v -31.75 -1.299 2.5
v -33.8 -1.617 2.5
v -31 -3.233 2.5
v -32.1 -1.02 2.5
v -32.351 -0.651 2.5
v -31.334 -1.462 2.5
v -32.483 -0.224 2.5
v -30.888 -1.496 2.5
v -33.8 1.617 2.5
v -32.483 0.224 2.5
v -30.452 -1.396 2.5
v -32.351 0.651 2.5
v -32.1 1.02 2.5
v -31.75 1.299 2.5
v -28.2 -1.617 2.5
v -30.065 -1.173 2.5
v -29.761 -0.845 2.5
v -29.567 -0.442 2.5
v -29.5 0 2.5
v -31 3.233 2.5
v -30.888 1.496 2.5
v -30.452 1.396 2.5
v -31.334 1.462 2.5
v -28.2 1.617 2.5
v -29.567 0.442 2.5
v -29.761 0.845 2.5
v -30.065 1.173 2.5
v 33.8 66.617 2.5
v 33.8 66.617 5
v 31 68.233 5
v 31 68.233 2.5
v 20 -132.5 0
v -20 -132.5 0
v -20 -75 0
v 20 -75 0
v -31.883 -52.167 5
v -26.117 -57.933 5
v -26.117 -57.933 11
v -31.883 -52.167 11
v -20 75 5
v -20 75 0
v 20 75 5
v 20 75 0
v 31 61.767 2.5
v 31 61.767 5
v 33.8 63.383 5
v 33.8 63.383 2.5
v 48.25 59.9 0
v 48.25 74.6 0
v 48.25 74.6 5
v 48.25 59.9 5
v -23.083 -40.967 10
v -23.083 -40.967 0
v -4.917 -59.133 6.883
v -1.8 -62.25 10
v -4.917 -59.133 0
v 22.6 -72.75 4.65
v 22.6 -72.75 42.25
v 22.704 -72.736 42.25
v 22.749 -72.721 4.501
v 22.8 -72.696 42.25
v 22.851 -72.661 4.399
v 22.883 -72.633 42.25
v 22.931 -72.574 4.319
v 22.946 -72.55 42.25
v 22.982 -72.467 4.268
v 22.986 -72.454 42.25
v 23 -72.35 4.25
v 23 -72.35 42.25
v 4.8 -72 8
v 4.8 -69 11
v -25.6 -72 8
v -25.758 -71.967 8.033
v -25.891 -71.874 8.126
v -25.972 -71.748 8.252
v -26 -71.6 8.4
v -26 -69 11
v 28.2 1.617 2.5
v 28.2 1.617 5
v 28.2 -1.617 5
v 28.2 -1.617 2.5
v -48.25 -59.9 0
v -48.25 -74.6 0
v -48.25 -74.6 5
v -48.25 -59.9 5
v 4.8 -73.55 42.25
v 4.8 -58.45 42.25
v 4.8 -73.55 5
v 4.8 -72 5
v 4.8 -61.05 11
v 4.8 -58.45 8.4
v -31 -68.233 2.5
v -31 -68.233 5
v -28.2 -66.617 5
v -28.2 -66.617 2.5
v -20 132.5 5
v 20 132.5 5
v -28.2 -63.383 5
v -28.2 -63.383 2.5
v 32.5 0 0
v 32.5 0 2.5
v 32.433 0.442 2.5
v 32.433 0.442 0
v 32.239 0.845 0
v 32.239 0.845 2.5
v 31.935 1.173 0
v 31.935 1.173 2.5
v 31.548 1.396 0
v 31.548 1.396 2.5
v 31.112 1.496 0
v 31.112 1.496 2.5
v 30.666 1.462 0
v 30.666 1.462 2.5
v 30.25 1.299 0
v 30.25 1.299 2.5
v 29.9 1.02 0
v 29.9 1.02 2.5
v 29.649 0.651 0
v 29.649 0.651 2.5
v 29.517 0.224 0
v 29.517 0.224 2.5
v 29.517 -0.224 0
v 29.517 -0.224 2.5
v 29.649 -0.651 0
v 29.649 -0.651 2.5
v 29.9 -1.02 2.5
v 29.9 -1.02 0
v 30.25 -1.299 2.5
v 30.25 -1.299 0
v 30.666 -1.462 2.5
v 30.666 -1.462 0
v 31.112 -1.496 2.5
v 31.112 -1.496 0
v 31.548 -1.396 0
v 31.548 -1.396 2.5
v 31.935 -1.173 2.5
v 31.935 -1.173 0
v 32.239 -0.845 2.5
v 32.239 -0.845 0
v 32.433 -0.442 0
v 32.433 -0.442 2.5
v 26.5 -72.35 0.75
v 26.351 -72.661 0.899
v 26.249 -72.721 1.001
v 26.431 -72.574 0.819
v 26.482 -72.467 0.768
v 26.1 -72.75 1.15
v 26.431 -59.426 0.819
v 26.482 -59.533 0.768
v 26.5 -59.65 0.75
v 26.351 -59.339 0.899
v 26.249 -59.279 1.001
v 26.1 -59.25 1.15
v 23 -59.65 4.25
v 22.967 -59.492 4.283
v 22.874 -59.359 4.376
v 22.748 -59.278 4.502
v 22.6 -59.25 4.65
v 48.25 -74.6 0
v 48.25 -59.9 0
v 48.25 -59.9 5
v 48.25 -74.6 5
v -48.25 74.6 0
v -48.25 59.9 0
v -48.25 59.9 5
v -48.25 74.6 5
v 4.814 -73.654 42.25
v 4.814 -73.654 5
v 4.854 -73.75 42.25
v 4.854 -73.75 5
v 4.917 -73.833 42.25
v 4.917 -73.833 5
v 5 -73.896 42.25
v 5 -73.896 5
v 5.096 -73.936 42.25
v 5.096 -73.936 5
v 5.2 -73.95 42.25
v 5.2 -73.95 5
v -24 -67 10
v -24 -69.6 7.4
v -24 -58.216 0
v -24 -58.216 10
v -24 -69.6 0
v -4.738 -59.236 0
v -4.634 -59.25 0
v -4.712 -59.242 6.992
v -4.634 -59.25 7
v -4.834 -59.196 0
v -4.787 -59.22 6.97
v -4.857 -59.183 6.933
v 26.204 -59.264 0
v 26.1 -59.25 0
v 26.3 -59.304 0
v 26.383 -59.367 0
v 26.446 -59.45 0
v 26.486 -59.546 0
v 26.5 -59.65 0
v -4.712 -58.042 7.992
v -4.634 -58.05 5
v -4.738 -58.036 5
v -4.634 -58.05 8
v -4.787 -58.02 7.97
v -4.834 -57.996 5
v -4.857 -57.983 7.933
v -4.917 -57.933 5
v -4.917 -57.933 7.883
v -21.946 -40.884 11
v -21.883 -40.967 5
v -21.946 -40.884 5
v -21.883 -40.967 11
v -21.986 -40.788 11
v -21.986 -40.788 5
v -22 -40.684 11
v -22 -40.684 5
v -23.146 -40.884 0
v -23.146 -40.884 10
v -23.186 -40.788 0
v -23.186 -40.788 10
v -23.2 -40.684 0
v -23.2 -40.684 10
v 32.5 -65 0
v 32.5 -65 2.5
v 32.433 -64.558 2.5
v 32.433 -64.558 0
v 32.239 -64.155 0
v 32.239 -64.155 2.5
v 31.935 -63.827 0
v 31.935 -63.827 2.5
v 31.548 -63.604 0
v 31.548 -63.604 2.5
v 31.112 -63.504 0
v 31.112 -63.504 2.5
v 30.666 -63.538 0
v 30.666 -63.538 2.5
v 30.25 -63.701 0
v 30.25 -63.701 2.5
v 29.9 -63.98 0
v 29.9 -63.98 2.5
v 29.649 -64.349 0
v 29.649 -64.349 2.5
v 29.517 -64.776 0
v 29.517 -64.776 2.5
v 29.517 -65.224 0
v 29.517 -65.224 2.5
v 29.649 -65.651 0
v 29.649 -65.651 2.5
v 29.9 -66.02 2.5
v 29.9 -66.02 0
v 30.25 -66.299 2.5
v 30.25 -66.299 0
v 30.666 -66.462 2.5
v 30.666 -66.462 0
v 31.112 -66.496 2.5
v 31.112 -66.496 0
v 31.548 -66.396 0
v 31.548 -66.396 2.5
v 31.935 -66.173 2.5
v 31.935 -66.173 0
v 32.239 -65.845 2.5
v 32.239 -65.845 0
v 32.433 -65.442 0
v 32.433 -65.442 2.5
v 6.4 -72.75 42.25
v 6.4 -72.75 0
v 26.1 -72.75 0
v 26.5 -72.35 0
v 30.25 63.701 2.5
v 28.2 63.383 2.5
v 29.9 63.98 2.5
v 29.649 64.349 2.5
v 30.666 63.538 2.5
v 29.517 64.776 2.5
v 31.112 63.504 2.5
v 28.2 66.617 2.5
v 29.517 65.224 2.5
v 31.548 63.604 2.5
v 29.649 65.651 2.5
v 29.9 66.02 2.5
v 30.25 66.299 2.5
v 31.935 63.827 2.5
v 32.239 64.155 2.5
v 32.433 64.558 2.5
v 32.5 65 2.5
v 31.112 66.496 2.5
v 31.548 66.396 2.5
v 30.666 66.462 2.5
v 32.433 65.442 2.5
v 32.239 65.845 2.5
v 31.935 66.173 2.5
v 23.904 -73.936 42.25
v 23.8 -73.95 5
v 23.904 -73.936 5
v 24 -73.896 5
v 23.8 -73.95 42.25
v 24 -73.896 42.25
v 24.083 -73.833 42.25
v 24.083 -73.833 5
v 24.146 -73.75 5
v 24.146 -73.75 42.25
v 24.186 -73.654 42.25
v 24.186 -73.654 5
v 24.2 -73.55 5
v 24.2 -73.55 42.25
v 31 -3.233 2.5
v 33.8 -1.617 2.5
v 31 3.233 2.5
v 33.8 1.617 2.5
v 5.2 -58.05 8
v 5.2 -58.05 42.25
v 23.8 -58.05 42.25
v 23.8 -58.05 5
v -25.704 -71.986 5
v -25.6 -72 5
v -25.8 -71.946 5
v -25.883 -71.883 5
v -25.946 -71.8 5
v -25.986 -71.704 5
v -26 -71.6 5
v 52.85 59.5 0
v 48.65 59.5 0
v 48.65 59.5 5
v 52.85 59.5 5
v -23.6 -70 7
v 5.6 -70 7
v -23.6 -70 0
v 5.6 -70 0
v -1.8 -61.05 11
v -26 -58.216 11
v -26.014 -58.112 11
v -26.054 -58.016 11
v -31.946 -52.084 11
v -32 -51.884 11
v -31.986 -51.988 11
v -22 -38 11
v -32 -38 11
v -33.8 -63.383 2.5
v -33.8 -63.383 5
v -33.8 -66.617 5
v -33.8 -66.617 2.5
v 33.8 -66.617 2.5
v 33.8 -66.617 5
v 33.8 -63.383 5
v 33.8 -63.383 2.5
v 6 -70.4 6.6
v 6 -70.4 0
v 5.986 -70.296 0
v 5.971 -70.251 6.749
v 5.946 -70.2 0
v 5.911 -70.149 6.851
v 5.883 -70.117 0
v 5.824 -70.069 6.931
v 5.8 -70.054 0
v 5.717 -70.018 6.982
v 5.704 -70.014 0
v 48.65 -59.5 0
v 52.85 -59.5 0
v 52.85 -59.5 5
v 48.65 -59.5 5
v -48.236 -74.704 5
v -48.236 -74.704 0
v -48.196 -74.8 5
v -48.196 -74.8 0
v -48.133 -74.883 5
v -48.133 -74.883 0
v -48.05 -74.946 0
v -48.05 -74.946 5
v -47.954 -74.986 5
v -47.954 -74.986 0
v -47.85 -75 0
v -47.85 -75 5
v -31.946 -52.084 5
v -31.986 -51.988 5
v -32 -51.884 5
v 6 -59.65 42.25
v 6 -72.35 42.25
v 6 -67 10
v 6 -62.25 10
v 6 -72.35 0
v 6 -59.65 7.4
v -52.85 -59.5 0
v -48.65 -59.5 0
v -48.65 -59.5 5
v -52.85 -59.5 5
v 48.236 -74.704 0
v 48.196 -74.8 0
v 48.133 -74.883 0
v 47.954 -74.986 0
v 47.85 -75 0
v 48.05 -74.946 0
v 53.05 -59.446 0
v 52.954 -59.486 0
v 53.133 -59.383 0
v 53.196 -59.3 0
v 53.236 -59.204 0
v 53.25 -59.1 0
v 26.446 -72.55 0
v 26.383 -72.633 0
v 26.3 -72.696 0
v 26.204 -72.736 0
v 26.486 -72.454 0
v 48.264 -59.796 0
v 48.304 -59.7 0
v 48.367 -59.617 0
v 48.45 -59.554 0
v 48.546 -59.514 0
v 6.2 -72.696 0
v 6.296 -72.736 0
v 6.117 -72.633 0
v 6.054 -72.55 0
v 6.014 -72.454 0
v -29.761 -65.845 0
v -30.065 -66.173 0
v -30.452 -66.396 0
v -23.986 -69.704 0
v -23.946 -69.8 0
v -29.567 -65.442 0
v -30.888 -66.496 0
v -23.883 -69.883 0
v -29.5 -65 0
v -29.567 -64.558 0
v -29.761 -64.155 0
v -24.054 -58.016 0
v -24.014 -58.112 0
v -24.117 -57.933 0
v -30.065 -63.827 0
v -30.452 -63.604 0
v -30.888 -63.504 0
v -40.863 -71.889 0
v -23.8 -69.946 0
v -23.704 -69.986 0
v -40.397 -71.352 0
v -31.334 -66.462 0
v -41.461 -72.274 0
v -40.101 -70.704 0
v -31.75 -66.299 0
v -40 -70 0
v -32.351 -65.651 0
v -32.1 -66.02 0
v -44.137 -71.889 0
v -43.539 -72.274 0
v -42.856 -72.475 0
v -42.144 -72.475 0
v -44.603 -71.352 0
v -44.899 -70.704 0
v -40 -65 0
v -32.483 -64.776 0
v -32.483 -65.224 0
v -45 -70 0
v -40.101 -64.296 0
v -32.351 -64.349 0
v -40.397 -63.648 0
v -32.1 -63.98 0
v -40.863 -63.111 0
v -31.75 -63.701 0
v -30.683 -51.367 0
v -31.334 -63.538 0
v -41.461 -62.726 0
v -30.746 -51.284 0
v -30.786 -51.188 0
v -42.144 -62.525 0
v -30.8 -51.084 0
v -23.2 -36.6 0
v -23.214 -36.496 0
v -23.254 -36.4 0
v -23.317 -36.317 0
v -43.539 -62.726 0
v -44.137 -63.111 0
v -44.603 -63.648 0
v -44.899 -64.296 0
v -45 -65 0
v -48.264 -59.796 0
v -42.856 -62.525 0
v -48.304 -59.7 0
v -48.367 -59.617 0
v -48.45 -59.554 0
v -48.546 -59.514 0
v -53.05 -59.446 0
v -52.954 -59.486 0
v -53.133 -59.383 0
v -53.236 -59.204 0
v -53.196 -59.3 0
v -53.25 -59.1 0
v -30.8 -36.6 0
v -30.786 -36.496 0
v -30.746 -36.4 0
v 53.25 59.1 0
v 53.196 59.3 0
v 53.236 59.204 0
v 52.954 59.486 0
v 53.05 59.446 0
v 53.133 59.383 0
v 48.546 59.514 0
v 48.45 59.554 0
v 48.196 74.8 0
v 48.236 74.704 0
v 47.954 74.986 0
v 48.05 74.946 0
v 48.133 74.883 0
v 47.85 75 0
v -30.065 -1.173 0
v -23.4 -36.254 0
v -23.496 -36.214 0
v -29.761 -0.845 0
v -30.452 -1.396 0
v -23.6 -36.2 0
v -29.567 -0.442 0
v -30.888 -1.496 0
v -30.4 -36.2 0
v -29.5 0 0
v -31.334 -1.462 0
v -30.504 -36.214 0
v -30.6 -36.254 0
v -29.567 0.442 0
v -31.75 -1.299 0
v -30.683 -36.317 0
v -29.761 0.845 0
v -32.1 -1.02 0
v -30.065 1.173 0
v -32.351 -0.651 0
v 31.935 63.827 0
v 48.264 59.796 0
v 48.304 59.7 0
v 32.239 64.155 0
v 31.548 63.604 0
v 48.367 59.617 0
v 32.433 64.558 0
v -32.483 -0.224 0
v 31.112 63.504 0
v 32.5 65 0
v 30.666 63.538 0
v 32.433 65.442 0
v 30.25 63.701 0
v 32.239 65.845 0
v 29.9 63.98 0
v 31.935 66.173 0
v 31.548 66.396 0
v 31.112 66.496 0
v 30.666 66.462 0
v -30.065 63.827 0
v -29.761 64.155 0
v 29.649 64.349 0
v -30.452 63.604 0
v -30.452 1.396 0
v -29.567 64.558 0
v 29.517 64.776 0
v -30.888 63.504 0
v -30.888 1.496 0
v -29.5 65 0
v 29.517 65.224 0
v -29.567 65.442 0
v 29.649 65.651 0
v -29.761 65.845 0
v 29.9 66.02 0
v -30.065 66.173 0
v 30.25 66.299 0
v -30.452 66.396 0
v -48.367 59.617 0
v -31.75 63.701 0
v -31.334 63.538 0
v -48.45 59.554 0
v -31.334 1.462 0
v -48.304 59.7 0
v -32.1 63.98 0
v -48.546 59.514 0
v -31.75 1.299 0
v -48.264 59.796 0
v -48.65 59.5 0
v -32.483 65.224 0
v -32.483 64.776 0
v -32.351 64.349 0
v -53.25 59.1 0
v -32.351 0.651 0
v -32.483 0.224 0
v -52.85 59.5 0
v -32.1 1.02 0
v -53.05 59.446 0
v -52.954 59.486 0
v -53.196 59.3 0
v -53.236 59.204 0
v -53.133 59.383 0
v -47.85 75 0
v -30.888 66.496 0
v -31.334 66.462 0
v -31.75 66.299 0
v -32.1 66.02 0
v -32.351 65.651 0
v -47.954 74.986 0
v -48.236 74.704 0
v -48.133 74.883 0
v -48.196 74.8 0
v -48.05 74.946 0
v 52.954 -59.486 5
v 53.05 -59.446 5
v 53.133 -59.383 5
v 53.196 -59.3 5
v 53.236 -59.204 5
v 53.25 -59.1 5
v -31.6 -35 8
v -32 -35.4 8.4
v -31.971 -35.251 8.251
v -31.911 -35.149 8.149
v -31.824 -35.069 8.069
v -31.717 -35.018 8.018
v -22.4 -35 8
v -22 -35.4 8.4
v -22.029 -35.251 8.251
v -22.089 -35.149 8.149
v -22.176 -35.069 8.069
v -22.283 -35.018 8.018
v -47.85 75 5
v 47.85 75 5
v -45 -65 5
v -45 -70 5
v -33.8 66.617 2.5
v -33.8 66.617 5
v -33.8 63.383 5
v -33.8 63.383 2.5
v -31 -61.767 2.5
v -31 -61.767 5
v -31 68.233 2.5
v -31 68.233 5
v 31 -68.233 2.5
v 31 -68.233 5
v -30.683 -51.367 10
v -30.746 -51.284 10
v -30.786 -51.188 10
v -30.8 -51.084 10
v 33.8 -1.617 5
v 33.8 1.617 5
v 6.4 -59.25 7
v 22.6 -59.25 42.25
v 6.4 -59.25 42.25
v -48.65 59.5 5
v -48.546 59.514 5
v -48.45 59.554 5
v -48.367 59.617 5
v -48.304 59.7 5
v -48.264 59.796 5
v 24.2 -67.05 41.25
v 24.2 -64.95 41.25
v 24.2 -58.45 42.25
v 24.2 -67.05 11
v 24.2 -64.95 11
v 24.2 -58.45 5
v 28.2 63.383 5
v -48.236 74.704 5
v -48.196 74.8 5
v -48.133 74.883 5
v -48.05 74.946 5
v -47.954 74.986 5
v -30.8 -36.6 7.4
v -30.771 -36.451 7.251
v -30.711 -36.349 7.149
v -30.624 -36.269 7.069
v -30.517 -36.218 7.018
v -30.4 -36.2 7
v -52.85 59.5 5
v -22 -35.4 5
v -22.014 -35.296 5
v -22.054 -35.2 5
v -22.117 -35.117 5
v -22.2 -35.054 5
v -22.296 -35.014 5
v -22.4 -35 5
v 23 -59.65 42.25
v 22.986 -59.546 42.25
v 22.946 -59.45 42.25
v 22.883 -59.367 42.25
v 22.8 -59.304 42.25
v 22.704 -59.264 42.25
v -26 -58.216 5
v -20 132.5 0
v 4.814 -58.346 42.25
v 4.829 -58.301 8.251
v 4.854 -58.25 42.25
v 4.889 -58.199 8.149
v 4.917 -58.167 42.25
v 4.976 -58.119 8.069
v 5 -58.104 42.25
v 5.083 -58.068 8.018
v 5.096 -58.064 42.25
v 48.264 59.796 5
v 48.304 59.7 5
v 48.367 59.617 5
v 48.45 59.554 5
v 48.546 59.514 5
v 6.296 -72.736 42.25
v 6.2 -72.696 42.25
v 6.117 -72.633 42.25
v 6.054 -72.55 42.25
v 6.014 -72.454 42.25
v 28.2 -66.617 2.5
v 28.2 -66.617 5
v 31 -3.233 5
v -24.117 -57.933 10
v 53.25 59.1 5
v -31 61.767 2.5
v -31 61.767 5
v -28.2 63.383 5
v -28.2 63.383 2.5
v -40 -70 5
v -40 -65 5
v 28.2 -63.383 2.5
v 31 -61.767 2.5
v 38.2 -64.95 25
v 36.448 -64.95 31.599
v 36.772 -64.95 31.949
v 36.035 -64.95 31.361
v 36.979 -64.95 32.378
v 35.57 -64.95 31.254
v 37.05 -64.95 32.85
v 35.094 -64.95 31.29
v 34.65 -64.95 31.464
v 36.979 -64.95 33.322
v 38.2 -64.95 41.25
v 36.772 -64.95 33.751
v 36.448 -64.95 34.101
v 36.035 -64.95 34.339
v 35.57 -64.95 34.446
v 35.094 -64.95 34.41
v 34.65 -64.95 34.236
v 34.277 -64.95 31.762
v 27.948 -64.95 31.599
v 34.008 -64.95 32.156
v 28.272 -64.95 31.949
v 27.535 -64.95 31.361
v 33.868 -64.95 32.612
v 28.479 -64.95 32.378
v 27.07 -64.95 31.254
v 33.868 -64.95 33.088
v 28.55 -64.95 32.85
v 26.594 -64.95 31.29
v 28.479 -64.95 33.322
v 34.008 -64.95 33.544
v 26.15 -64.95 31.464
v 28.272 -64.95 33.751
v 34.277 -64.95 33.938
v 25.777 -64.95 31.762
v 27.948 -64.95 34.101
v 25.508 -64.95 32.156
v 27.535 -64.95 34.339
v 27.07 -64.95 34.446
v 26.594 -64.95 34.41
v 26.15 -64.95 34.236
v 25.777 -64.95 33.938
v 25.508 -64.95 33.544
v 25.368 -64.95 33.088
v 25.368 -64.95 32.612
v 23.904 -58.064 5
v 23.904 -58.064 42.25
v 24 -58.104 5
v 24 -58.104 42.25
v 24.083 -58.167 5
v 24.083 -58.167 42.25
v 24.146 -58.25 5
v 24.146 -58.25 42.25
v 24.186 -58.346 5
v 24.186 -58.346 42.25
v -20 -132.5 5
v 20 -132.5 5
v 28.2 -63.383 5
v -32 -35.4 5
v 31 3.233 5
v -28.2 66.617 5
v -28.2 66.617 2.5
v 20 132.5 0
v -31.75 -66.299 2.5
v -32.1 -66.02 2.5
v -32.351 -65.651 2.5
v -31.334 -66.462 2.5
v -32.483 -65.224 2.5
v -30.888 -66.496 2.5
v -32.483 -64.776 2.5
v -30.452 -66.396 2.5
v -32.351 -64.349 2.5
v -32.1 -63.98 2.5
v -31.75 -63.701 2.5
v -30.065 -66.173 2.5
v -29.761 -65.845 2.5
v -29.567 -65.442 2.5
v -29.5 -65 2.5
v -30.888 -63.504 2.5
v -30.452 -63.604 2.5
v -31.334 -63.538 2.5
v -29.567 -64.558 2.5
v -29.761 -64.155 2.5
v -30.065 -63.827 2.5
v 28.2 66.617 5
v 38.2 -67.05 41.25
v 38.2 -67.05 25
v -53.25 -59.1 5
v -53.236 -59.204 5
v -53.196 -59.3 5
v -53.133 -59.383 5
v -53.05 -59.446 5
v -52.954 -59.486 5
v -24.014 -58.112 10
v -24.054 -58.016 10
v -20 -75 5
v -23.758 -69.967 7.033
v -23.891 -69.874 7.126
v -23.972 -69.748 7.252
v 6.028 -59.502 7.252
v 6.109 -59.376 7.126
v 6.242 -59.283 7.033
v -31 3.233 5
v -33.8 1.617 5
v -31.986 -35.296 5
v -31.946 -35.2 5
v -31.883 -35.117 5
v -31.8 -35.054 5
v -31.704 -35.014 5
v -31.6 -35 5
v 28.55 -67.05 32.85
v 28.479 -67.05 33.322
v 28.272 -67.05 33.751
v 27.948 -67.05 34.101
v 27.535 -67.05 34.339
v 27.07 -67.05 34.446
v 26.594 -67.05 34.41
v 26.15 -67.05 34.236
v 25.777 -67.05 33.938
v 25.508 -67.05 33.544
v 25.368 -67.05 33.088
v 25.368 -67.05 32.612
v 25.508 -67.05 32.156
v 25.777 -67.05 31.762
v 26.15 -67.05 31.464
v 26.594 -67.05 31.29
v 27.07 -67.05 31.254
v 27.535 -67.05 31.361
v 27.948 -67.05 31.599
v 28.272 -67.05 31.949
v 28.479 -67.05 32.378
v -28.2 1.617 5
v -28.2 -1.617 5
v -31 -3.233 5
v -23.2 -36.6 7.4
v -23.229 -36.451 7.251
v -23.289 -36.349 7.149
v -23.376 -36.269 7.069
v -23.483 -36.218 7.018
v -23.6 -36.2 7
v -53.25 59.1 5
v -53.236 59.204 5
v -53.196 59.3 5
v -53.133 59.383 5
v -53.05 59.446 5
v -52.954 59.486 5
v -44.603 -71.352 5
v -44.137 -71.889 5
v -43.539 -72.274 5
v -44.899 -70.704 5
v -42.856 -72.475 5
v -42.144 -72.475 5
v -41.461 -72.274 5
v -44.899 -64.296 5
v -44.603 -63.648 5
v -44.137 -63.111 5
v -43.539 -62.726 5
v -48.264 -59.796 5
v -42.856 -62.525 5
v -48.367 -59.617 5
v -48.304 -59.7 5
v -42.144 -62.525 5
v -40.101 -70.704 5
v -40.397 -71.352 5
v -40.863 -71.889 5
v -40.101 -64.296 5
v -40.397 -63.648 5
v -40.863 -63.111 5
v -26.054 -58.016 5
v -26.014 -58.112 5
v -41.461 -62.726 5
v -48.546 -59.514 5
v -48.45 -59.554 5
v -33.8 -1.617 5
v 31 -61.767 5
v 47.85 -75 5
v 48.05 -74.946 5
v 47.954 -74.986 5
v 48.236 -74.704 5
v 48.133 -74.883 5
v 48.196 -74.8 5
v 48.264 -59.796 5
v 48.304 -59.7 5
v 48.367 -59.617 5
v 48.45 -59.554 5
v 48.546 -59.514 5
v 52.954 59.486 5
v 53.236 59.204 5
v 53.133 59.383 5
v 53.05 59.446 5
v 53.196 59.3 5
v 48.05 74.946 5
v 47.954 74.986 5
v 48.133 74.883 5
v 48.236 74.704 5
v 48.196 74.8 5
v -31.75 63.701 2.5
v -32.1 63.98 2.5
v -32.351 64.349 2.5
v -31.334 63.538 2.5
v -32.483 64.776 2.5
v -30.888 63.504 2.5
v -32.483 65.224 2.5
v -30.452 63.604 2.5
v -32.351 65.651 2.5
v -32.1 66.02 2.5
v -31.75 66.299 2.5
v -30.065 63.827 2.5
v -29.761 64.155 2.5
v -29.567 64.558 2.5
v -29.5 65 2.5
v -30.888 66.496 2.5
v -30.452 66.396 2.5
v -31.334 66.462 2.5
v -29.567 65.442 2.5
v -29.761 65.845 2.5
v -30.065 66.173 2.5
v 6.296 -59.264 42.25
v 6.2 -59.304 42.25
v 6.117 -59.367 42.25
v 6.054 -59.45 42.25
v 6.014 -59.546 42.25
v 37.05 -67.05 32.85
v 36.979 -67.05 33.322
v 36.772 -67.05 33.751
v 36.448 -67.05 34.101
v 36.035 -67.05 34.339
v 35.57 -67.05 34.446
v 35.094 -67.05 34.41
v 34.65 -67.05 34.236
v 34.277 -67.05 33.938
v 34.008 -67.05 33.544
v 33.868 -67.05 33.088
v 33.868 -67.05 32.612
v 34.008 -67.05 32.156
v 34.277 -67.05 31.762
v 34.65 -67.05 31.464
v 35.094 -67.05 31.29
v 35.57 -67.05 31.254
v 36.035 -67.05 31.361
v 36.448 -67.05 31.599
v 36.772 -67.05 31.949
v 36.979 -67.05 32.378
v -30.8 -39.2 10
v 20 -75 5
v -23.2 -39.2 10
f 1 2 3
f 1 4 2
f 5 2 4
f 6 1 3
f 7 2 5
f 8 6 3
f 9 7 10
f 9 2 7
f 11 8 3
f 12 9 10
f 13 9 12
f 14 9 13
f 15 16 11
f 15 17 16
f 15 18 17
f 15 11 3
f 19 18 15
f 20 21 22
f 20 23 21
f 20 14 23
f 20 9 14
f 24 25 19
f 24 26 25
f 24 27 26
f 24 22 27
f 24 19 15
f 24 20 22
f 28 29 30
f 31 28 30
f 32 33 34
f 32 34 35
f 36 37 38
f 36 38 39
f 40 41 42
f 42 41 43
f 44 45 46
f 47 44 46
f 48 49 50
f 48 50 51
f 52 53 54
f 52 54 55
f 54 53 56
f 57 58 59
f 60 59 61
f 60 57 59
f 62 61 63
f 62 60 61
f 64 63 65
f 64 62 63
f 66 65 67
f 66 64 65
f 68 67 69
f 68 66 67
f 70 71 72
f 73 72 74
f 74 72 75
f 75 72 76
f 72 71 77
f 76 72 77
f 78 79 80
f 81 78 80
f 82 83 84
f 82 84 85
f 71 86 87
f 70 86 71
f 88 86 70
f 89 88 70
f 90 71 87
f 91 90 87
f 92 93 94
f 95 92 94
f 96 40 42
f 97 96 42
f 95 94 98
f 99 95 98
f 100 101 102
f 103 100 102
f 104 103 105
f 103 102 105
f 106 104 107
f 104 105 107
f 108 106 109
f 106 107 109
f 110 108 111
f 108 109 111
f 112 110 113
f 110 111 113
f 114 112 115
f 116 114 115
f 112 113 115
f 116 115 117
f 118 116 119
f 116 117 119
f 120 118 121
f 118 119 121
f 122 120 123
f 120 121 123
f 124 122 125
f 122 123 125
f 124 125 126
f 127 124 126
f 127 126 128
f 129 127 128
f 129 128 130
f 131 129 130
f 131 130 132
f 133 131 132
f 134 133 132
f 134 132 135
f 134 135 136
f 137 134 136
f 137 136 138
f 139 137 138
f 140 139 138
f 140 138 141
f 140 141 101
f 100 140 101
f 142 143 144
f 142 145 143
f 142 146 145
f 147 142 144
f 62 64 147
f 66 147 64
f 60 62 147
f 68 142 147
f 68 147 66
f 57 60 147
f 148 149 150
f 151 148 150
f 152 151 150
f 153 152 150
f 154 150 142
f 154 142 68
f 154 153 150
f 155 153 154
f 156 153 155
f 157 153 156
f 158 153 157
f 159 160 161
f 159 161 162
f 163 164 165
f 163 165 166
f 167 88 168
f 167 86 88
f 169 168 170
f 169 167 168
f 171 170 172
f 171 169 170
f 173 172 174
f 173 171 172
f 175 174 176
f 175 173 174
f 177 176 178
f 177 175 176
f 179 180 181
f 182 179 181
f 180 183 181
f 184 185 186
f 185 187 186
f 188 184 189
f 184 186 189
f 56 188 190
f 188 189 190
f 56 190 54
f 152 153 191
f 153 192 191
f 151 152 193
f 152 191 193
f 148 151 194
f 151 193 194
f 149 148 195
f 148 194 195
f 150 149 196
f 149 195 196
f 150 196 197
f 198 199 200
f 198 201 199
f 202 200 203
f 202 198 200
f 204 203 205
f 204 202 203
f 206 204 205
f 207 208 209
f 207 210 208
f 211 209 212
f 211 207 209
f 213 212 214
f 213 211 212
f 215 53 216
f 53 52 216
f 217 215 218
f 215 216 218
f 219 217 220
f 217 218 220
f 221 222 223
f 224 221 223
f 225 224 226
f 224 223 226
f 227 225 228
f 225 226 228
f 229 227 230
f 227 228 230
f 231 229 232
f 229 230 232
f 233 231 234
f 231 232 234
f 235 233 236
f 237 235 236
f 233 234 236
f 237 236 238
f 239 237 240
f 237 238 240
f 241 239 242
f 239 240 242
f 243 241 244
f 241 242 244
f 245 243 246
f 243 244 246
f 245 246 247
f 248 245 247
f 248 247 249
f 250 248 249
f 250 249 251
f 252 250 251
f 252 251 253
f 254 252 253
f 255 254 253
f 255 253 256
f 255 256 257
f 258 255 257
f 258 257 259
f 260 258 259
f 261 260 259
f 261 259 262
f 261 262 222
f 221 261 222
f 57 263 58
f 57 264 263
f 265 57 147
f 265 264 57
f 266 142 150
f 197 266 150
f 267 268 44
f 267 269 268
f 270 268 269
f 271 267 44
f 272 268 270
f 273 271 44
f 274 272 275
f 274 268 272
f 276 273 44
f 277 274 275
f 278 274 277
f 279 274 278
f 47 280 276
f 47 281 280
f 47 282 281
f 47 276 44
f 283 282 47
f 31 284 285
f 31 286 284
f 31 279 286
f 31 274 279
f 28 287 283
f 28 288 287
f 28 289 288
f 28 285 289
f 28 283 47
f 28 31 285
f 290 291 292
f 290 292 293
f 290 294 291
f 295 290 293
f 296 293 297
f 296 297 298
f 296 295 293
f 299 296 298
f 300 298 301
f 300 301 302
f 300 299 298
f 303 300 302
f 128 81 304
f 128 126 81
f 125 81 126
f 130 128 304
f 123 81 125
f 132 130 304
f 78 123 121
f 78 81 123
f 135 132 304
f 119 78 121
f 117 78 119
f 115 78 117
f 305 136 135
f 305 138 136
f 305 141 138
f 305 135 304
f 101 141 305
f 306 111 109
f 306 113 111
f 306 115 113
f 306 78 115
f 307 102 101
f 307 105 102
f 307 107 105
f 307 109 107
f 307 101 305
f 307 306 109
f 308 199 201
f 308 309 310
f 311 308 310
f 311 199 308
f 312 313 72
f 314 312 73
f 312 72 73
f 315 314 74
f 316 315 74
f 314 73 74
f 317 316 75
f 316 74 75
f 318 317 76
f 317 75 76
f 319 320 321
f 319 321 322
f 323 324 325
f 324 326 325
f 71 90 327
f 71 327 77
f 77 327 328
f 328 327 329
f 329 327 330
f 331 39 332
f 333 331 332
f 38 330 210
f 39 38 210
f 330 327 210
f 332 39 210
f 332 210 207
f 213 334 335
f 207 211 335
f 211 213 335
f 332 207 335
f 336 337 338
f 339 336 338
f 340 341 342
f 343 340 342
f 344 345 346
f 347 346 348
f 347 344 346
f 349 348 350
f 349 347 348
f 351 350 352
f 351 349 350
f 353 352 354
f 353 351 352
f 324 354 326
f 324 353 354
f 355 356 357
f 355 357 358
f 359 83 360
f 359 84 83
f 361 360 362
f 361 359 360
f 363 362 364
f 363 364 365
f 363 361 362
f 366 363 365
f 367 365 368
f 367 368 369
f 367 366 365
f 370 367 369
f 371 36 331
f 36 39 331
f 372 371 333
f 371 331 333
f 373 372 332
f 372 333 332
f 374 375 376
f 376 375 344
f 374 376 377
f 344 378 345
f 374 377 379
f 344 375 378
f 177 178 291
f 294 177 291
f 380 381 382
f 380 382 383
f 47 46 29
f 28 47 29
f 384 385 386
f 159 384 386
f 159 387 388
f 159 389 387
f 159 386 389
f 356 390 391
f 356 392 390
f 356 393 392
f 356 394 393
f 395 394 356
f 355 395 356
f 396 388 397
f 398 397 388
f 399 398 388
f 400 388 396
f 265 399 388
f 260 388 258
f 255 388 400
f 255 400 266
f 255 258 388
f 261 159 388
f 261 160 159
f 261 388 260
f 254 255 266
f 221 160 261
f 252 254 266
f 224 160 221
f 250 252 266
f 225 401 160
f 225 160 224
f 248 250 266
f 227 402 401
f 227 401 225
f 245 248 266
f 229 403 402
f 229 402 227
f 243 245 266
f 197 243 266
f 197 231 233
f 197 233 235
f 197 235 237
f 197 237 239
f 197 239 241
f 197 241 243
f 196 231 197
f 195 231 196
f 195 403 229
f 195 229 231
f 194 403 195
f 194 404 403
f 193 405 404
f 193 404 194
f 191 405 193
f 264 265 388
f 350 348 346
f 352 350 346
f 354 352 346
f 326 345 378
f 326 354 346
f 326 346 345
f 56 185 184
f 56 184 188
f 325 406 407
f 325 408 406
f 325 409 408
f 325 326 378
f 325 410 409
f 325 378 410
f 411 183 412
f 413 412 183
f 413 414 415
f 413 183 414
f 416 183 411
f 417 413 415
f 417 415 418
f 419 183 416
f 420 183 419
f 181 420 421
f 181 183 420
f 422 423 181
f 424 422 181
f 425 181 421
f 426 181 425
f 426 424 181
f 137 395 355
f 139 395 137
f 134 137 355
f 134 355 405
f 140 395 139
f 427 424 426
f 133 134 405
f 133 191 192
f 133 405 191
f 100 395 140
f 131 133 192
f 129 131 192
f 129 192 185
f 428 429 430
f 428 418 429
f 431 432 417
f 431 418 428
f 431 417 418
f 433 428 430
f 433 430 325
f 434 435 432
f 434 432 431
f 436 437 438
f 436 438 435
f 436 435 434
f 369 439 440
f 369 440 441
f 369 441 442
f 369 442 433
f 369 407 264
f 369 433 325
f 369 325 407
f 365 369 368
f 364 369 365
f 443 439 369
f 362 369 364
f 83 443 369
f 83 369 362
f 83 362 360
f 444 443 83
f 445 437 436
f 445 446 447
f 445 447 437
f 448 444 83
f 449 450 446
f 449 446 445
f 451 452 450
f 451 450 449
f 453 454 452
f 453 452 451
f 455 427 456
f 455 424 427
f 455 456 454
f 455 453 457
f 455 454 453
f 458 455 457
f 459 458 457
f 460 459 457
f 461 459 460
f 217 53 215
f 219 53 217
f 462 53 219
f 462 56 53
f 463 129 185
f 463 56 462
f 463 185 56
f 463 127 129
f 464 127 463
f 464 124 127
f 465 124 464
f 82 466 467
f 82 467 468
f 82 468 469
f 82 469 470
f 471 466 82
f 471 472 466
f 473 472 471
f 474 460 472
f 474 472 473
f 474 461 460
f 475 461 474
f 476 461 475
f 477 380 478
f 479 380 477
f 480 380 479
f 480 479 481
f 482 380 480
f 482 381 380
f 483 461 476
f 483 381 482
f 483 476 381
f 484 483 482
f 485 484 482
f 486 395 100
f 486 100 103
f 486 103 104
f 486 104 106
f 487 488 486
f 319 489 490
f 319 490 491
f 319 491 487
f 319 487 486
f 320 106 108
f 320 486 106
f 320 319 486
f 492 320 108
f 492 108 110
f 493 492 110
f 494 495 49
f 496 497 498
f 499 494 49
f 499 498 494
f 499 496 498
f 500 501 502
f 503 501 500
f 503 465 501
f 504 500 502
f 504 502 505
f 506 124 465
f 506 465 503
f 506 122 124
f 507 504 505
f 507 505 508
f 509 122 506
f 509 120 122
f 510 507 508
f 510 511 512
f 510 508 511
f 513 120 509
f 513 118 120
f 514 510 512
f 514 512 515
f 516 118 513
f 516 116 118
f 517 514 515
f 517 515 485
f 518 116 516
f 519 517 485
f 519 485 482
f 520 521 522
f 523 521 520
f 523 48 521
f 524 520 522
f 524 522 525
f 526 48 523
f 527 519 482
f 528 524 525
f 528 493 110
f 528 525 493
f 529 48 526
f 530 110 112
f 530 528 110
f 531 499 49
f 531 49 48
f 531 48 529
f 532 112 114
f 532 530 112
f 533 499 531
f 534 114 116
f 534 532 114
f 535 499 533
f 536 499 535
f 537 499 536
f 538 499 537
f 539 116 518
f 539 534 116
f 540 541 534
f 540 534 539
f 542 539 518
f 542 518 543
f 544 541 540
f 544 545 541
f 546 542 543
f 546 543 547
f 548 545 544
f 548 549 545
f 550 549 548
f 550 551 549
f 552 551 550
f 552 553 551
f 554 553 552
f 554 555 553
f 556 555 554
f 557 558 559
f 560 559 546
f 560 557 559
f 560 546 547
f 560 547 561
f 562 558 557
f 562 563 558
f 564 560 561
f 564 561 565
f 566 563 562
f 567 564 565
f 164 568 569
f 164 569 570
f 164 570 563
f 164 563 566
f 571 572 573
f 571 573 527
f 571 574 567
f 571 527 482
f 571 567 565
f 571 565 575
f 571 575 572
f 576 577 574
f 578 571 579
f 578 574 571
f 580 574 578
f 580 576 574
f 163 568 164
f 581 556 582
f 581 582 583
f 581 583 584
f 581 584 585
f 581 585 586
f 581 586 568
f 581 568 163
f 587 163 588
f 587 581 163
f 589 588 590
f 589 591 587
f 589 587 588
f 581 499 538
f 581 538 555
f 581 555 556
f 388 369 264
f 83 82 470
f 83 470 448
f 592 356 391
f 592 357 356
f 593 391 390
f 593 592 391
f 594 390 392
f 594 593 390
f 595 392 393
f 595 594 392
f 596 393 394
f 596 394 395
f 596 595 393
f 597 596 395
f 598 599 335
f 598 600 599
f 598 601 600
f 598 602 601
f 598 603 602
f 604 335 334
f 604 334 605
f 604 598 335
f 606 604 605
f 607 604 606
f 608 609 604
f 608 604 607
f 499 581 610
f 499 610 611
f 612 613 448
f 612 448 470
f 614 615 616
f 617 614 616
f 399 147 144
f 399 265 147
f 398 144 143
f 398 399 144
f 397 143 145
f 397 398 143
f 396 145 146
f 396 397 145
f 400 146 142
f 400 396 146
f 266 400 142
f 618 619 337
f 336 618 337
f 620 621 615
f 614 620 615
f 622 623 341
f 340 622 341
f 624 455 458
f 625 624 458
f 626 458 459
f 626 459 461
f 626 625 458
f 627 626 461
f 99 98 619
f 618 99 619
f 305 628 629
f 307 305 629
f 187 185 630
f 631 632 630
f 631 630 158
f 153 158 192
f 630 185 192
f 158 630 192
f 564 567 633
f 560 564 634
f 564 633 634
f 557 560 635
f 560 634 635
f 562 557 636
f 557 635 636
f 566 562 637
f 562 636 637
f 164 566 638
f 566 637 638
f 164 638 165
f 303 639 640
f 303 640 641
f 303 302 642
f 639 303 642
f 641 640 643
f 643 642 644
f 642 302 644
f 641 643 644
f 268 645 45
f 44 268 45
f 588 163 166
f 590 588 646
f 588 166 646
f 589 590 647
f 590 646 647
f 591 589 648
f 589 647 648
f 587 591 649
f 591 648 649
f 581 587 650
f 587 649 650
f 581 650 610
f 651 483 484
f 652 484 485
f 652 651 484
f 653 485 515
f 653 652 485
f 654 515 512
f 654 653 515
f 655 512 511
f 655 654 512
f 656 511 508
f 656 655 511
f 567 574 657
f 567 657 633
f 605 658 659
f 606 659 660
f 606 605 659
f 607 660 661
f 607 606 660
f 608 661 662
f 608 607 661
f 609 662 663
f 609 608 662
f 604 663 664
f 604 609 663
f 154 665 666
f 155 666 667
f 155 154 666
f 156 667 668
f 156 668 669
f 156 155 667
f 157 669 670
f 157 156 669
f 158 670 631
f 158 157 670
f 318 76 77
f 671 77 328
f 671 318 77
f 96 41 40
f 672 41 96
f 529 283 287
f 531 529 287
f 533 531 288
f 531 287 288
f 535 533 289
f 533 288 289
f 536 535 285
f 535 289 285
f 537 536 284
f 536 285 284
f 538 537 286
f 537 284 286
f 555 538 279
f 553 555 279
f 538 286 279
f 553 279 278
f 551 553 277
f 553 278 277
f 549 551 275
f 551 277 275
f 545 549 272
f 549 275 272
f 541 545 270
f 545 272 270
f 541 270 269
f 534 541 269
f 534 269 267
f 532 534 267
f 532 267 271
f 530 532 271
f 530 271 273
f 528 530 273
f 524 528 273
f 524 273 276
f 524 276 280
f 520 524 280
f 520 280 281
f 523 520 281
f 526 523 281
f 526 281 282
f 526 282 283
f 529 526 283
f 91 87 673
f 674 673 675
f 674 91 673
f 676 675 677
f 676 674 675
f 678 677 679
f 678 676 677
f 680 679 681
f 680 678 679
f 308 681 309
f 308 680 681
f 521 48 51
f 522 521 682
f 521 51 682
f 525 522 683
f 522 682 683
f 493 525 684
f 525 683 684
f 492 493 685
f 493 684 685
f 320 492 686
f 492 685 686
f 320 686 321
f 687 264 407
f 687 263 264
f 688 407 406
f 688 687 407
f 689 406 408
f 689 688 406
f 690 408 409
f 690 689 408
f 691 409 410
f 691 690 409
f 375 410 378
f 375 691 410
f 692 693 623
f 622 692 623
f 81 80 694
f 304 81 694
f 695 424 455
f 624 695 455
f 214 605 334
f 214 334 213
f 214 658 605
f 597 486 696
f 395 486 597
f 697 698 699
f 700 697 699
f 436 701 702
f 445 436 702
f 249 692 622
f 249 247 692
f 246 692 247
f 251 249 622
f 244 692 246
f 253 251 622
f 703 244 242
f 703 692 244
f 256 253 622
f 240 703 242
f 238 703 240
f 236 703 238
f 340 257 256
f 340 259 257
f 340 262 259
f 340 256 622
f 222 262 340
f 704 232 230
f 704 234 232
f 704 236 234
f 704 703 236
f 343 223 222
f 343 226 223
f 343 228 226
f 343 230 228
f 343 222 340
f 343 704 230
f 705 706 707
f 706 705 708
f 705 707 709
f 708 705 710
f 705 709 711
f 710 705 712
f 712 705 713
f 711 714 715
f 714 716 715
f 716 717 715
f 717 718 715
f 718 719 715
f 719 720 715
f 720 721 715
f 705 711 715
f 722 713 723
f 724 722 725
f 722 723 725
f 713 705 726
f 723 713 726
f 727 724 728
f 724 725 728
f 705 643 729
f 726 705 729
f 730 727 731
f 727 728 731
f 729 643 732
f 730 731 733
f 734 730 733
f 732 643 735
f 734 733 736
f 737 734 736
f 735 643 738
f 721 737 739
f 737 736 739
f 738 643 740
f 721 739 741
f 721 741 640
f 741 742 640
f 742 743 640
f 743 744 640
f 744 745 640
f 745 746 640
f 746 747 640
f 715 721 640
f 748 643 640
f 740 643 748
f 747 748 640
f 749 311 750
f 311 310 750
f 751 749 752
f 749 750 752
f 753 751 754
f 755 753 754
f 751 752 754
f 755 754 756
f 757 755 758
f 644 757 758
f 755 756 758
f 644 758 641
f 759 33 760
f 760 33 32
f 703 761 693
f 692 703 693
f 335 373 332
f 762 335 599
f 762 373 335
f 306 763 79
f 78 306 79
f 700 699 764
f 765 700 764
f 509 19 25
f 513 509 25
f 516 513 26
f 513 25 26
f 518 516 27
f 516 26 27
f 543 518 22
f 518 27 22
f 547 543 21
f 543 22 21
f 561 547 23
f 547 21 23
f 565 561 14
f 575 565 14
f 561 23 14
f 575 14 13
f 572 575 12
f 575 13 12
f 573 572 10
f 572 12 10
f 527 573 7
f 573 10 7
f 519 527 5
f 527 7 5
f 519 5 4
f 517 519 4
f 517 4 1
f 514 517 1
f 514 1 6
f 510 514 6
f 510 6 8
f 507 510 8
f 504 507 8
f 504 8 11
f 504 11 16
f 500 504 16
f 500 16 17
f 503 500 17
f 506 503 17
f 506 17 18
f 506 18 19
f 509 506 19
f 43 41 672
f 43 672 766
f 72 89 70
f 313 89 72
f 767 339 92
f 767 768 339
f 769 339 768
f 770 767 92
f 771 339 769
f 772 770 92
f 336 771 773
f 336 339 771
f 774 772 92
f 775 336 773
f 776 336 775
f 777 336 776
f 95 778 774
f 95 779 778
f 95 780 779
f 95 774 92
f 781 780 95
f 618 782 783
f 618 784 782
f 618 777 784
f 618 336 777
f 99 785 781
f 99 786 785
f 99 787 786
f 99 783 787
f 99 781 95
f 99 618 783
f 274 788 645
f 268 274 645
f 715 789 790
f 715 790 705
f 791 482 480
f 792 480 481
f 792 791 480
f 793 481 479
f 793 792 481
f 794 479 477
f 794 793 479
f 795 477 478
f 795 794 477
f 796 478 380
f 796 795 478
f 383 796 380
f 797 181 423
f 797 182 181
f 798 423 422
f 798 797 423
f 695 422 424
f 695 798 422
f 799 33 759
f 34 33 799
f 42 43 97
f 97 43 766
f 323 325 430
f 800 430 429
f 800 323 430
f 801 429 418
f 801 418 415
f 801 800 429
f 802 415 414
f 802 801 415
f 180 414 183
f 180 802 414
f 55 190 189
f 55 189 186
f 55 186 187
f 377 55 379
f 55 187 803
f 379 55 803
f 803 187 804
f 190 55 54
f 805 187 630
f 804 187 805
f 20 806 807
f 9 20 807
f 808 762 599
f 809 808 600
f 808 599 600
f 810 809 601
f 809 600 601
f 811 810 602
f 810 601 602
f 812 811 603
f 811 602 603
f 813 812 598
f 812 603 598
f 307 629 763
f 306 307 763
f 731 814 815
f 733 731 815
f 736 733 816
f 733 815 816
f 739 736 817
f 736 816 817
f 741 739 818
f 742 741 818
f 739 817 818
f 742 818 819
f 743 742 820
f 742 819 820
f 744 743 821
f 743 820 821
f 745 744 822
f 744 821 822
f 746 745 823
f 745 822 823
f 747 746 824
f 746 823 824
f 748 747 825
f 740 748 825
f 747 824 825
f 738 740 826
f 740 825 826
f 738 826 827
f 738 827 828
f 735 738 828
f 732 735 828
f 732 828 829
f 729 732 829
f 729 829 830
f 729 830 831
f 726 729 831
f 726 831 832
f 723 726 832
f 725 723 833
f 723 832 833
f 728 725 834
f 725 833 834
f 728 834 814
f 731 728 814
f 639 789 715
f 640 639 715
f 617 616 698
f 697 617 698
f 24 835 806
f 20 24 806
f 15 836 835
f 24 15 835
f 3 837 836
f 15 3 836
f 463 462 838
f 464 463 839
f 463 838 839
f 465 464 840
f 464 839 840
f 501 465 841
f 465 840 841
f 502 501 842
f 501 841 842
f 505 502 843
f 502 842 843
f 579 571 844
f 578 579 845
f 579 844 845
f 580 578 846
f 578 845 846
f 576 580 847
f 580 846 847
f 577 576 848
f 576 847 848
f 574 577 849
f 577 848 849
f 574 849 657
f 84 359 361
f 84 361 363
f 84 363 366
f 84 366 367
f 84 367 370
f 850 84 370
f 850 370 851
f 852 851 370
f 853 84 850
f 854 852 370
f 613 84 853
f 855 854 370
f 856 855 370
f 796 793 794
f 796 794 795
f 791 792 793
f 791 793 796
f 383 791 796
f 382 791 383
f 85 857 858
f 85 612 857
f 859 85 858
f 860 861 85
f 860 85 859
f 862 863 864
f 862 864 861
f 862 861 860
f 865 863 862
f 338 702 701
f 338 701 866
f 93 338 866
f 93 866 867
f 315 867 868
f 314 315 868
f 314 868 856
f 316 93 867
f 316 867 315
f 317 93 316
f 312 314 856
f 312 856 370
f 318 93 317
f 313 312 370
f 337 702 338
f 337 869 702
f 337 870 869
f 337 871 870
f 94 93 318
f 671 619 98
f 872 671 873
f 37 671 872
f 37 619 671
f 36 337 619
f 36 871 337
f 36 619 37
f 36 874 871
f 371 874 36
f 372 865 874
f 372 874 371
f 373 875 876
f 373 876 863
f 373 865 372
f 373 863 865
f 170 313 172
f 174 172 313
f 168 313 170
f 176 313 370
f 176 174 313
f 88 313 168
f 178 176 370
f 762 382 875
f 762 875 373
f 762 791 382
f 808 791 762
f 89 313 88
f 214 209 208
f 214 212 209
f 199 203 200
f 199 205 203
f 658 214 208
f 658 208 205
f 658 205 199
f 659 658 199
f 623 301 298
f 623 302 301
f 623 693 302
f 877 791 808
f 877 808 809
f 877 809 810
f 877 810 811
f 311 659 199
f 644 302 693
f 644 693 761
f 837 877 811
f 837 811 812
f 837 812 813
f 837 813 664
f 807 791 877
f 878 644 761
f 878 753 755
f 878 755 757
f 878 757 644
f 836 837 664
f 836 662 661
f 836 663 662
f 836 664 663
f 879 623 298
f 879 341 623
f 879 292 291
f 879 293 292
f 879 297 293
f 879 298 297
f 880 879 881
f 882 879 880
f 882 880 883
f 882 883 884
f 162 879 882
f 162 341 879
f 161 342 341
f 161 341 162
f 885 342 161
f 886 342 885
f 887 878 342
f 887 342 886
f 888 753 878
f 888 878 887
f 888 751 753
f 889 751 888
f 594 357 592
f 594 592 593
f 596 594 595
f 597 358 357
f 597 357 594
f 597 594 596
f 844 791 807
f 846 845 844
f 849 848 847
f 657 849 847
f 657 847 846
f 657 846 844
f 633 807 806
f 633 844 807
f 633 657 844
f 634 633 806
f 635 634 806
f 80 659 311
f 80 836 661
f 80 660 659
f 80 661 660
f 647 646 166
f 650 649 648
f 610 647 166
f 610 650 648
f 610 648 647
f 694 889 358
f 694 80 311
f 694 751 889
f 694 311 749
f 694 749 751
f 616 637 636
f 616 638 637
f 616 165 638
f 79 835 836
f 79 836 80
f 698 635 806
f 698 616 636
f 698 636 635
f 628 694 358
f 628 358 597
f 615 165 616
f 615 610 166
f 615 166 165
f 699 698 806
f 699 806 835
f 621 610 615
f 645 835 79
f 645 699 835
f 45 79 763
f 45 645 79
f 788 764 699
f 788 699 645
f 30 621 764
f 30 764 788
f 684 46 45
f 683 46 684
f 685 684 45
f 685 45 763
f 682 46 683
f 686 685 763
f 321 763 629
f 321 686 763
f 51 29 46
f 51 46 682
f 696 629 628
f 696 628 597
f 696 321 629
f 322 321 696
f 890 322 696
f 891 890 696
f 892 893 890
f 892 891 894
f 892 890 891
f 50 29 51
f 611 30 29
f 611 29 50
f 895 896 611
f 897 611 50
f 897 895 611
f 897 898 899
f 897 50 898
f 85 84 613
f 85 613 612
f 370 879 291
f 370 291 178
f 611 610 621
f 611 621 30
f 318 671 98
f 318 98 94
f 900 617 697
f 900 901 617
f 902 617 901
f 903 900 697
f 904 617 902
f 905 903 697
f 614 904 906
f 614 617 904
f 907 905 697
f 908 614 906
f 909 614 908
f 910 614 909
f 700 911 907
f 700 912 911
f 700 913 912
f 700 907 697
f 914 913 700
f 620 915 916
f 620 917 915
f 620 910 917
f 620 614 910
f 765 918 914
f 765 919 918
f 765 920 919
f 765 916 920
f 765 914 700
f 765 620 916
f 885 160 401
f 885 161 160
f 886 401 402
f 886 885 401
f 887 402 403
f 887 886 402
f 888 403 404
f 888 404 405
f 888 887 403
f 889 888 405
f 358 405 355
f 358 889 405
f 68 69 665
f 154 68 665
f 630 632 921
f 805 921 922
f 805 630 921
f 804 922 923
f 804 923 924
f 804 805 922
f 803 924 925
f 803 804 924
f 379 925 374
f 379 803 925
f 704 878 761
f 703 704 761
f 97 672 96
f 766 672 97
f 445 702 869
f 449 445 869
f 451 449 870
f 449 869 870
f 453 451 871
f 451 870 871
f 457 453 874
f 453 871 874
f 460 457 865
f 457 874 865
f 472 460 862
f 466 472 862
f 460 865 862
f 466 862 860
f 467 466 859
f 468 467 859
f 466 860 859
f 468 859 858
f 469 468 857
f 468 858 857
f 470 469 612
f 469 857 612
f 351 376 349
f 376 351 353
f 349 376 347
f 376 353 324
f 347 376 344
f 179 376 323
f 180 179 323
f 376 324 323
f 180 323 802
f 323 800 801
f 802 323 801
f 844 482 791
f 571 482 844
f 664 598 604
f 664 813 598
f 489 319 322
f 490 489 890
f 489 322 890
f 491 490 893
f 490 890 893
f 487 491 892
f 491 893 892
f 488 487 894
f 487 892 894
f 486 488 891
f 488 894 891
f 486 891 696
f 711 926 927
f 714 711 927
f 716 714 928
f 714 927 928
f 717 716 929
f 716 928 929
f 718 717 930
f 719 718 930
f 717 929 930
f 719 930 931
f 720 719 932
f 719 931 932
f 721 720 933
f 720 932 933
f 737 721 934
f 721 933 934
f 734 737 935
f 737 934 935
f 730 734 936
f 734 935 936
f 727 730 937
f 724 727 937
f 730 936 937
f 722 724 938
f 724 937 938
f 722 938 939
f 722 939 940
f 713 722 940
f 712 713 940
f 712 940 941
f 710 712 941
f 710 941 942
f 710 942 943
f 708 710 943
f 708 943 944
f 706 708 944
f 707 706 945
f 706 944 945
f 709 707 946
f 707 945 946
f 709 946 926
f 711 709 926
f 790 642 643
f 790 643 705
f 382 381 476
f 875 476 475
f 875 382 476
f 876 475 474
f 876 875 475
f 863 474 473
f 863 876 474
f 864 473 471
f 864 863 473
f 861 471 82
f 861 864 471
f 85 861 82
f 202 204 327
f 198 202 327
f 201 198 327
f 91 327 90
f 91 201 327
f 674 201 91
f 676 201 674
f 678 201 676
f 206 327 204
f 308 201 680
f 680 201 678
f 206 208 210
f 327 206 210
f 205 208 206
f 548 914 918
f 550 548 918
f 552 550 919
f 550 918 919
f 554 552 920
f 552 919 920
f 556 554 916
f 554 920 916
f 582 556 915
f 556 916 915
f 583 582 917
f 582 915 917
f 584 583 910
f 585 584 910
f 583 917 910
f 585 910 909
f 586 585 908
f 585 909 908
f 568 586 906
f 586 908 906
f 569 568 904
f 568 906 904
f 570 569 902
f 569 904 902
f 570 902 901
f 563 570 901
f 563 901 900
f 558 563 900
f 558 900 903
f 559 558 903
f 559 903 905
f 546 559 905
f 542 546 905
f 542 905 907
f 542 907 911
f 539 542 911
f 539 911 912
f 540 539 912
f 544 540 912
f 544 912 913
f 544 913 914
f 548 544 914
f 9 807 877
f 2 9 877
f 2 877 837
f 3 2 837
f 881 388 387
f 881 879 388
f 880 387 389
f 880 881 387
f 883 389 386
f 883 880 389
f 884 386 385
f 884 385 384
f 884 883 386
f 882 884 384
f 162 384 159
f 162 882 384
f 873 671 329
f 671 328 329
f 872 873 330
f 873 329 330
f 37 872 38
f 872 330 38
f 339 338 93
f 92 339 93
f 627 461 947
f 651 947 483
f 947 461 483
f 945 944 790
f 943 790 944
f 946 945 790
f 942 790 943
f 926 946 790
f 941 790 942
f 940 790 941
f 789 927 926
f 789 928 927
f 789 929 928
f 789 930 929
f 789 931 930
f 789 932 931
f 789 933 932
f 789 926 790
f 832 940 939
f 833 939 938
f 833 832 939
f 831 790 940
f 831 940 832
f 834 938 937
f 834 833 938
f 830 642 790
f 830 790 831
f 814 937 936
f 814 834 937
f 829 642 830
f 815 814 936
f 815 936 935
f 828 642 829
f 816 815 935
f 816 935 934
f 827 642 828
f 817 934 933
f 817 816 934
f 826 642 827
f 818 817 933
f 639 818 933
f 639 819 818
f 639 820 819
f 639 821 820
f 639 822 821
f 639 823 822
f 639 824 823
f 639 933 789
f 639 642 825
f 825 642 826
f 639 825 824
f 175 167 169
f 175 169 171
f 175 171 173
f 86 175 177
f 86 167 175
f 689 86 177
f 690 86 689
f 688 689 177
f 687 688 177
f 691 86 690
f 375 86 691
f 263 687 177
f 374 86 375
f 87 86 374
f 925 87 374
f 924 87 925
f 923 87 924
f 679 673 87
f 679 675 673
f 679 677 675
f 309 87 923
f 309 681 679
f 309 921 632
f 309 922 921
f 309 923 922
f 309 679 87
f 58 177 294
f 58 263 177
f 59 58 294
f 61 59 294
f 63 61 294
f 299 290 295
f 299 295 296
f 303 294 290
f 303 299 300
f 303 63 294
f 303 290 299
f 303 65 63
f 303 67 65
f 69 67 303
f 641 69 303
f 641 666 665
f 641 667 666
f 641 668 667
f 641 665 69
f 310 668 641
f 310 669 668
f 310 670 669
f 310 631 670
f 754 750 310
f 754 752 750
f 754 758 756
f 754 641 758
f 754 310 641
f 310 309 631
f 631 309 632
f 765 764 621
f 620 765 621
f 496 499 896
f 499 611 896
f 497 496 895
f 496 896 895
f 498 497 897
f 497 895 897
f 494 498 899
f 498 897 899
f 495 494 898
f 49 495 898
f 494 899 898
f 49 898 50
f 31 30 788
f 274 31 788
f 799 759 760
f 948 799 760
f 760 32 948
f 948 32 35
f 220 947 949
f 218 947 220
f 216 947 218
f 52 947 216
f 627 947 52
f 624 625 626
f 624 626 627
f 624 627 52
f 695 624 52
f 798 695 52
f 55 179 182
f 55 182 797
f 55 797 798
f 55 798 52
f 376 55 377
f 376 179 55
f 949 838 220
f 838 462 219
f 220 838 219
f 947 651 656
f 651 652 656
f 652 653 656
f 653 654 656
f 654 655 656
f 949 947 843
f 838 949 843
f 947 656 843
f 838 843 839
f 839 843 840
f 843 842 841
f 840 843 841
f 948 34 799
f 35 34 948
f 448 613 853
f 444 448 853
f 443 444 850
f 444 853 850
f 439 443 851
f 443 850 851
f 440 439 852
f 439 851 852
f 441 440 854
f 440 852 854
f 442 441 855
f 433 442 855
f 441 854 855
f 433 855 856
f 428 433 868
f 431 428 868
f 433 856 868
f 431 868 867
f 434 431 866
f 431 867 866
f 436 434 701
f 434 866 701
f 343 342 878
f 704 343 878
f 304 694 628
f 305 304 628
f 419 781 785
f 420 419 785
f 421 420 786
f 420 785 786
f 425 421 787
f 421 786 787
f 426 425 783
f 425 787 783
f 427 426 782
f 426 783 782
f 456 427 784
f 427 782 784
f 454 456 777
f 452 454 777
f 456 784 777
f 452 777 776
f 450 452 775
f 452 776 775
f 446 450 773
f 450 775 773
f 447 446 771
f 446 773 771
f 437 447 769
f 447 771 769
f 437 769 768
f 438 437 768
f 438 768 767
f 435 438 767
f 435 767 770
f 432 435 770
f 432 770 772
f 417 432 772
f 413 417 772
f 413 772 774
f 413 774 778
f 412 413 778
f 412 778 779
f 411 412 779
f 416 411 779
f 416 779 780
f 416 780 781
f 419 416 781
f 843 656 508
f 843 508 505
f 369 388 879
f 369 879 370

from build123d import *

# Parameters (mm, degrees)
SKETCH417_W     = 40
SKETCH417_H     = 57.5
PAD197_DEPTH    = 5
SKETCH418_W     = 40
SKETCH418_H     = 57.5
PAD198_DEPTH    = 5
PAD_DEPTH       = 5
SKETCH002_R     = 1.5
POCKET_DEPTH    = 2.5
SKETCH003_R     = 1.5
POCKET001_DEPTH = 5
SKETCH004_W     = 20.5
SKETCH004_H     = 13.5
POCKET002_DEPTH = 5
PAD001_DEPTH    = 13.5
SKETCH007_W     = 19.4
SKETCH007_H     = 15.9
SKETCH007_W_2   = 17
SKETCH007_H_2   = 13.5
PAD002_DEPTH    = 37.25
SKETCH008_W     = 2.1
SKETCH008_H     = 36.25
PAD003_DEPTH    = 14
POCKET003_DEPTH = 2.1
SKETCH010_R     = 1.6
POCKET004_DEPTH = 2.1
PAD193_DEPTH    = 6
POCKET198_DEPTH = 10
CHAMFER_SIZE    = 3
POCKET218_DEPTH = 5
FILLET_R        = 0.4


with BuildPart() as circuitry_mountingplate_front_extension:
    # Sketch417 → Pad197 (new body)
    with BuildSketch(Plane.XY):
        with Locations((0, 103.75)):
            Rectangle(SKETCH417_W, SKETCH417_H)
    extrude(amount=PAD197_DEPTH)


with BuildPart() as circuitry_mountingplate_rear_extension:
    # Sketch418 → Pad198 (new body)
    with BuildSketch(Plane.XY):
        with Locations((0, -103.75)):
            Rectangle(SKETCH418_W, SKETCH418_H)
    extrude(amount=PAD198_DEPTH)


with BuildPart() as circuitry_mountingplate_base:
    # Sketch → Pad (new body)
    with BuildSketch(Plane.XY):
        Polygon((-53.25, -59.5), (-53.25, 59.5), (-48.25, 59.5), (-48.25, 75), (48.25, 75), (48.25, 59.5), (53.25, 59.5), (53.25, -59.5), (48.25, -59.5), (48.25, -75), (-48.25, -75), (-48.25, -59.5), align=None)
    extrude(amount=PAD_DEPTH)

    # Sketch002 (on Face14 of Pad) → Pocket (cut)
    with BuildSketch(Plane.XY.offset(5)):
        Polygon((-31, -61.766838), (-33.8, -63.383419), (-33.8, -66.616581), (-31, -68.233162), (-28.2, -66.616581), (-28.2, -63.383419), align=None)
        with Locations((-31, -65)):
            Circle(SKETCH002_R, mode=Mode.SUBTRACT)
        Polygon((31, -61.766838), (28.2, -63.383419), (28.2, -66.616581), (31, -68.233162), (33.8, -66.616581), (33.8, -63.383419), align=None)
        with Locations((31, -65)):
            Circle(SKETCH002_R, mode=Mode.SUBTRACT)
        Polygon((31, 3.233162), (28.2, 1.616581), (28.2, -1.616581), (31, -3.233162), (33.8, -1.616581), (33.8, 1.616581), align=None)
        with Locations((31, 0)):
            Circle(SKETCH002_R, mode=Mode.SUBTRACT)
        Polygon((-31, 3.233162), (-33.8, 1.616581), (-33.8, -1.616581), (-31, -3.233162), (-28.2, -1.616581), (-28.2, 1.616581), align=None)
        with Locations((-31, 0)):
            Circle(SKETCH002_R, mode=Mode.SUBTRACT)
        Polygon((-31, 68.233162), (-33.8, 66.616581), (-33.8, 63.383419), (-31, 61.766838), (-28.2, 63.383419), (-28.2, 66.616581), align=None)
        with Locations((-31, 65)):
            Circle(SKETCH002_R, mode=Mode.SUBTRACT)
        Polygon((31, 68.233162), (28.2, 66.616581), (28.2, 63.383419), (31, 61.766838), (33.8, 63.383419), (33.8, 66.616581), align=None)
        with Locations((31, 65)):
            Circle(SKETCH002_R, mode=Mode.SUBTRACT)
    extrude(amount=-POCKET_DEPTH, mode=Mode.SUBTRACT)

    # Sketch003 (on Face63 of Pocket) → Pocket001 (cut)
    with BuildSketch(Plane.XY.offset(5)):
        with Locations((-31, 65)):
            Circle(SKETCH003_R)
        with Locations((31, 65)):
            Circle(SKETCH003_R)
        with Locations((31, 0)):
            Circle(SKETCH003_R)
        with Locations((-31, 0)):
            Circle(SKETCH003_R)
        with Locations((-31, -65)):
            Circle(SKETCH003_R)
        with Locations((31, -65)):
            Circle(SKETCH003_R)
    extrude(amount=-POCKET001_DEPTH, mode=Mode.SUBTRACT)

    # Sketch004 (on Face5 of Pocket001) → Pocket002 (cut)
    with BuildSketch(Plane.XY.offset(5)):
        with Locations((16.25, -66)):
            Rectangle(SKETCH004_W, SKETCH004_H)
    extrude(amount=-POCKET002_DEPTH, mode=Mode.SUBTRACT)

    # Sketch006 (on Face20 of Pocket002) → Pad001 (join)
    with BuildSketch(Plane.XZ.offset(59.25)):
        Polygon((26.5, 0.75), (23, 4.25), (23, 5), (26.5, 5), align=None)
    extrude(amount=PAD001_DEPTH)

    # Sketch007 (on Face5 of Pad001) → Pad002 (join)
    with BuildSketch(Plane.XY.offset(5)):
        with Locations((14.5, -66)):
            Rectangle(SKETCH007_W, SKETCH007_H)
        with Locations((14.5, -66)):
            Rectangle(SKETCH007_W_2, SKETCH007_H_2, mode=Mode.SUBTRACT)
    extrude(amount=PAD002_DEPTH)

    # Sketch008 (on Face38 of Pad002) → Pad003 (join)
    with BuildSketch(Plane.YZ.offset(24.2)):
        with Locations((-66, 23.125)):
            Rectangle(SKETCH008_W, SKETCH008_H)
    extrude(amount=PAD003_DEPTH)

    # Sketch009 (on Face52 of Pad003) → Pocket003 (cut)
    with BuildSketch(Plane.XZ.offset(67.05)):
        Polygon((24.2, 5), (24.2, 11), (38.2, 25), (38.2, 5), align=None)
    extrude(amount=-POCKET003_DEPTH, mode=Mode.SUBTRACT)

    # Sketch010 (on Face83 of Pocket003) → Pocket004 (cut)
    with BuildSketch(Plane.XZ.offset(67.05)):
        with Locations((26.95, 32.85)):
            Circle(SKETCH010_R)
        with Locations((35.45, 32.85)):
            Circle(SKETCH010_R)
    extrude(amount=-POCKET004_DEPTH, mode=Mode.SUBTRACT)

    # Sketch410 (on Face5 of Pocket004) → Pad193 (join)
    with BuildSketch(Plane.XY.offset(5)):
        Polygon((4.8, -72), (-26, -72), (-26, -58.05), (-32, -52.05), (-32, -35), (-22, -35), (-22, -40.85), (-4.8, -58.05), (4.8, -58.05), align=None)
    extrude(amount=PAD193_DEPTH)

    # Sketch414 (on Face4 of Pad193) → Pocket198 (cut)
    with BuildSketch(Plane(origin=(0, 0, 0), x_dir=(1, 0, 0), z_dir=(0, 0, -1))):
        Polygon((6, 70), (-24, 70), (-24, 58.05), (-30.8, 51.25), (-30.8, 36.2), (-23.2, 36.2), (-23.2, 40.85), (-4.8, 59.25), (6, 59.25), align=None)
    extrude(amount=-POCKET198_DEPTH, mode=Mode.SUBTRACT)

    # Chamfer
    chamfer_edges = [circuitry_mountingplate_base.edges().sort_by_distance(p)[0] for p in [
        (-10.6, -72, 11),
        (0, -58.05, 11),
        (-27, -35, 11),
        (-27, -36.2, 10),
        (0.6, -59.25, 10),
        (-9, -70, 10),
    ]]
    chamfer(chamfer_edges, length=CHAMFER_SIZE)

    # Sketch449 → Pocket218 (cut)
    with BuildSketch(Plane.XY.offset(5)):
        with BuildLine():
            ThreePointArc((-45, -70), (-42.5, -72.5), (-40, -70))
            Line((-40, -70), (-40, -65))
            ThreePointArc((-40, -65), (-42.5, -62.5), (-45, -65))
            Line((-45, -70), (-45, -65))
        make_face()
    extrude(amount=-POCKET218_DEPTH, mode=Mode.SUBTRACT)

    # Fillet
    fillet_edges = [circuitry_mountingplate_base.edges().sort_by_distance(p)[0] for p in [
        (48.25, -75, 2.5),
        (48.25, -59.5, 2.5),
        (53.25, -59.5, 2.5),
        (53.25, 59.5, 2.5),
        (48.25, 59.5, 2.5),
        (48.25, 75, 2.5),
        (-48.25, 75, 2.5),
        (-48.25, 59.5, 2.5),
        (-53.25, 59.5, 2.5),
        (-53.25, -59.5, 2.5),
        (-48.25, -59.5, 2.5),
        (-48.25, -75, 2.5),
        (-30.8, -36.2, 3.5),
        (-24, -58.05, 5),
        (-30.8, -51.25, 5),
        (-24, -70, 3.5),
        (6, -70, 2.5),
        (6, -72.75, 2.5),
        (26.5, -72.75, 0.375),
        (26.5, -59.25, 0.375),
        (-4.8, -59.25, 3.5),
        (-23.2, -40.85, 5),
        (-23.2, -36.2, 3.5),
        (23, -59.25, 23.625),
        (23, -72.75, 23.625),
        (6, -72.75, 23.625),
        (6, -59.25, 8.5),
        (24.2, -73.95, 23.625),
        (24.2, -58.05, 23.625),
        (4.8, -58.05, 26.625),
        (4.8, -73.95, 23.625),
        (-26, -72, 6.5),
        (-26, -58.05, 8),
        (-32, -52.05, 8),
        (-32, -35, 6.5),
        (-22, -35, 6.5),
        (-22, -40.85, 8),
        (-4.8, -58.05, 6.5),
    ]]
    fillet(fillet_edges, radius=FILLET_R)


solid = Compound([circuitry_mountingplate_front_extension.part, circuitry_mountingplate_rear_extension.part, circuitry_mountingplate_base.part])
